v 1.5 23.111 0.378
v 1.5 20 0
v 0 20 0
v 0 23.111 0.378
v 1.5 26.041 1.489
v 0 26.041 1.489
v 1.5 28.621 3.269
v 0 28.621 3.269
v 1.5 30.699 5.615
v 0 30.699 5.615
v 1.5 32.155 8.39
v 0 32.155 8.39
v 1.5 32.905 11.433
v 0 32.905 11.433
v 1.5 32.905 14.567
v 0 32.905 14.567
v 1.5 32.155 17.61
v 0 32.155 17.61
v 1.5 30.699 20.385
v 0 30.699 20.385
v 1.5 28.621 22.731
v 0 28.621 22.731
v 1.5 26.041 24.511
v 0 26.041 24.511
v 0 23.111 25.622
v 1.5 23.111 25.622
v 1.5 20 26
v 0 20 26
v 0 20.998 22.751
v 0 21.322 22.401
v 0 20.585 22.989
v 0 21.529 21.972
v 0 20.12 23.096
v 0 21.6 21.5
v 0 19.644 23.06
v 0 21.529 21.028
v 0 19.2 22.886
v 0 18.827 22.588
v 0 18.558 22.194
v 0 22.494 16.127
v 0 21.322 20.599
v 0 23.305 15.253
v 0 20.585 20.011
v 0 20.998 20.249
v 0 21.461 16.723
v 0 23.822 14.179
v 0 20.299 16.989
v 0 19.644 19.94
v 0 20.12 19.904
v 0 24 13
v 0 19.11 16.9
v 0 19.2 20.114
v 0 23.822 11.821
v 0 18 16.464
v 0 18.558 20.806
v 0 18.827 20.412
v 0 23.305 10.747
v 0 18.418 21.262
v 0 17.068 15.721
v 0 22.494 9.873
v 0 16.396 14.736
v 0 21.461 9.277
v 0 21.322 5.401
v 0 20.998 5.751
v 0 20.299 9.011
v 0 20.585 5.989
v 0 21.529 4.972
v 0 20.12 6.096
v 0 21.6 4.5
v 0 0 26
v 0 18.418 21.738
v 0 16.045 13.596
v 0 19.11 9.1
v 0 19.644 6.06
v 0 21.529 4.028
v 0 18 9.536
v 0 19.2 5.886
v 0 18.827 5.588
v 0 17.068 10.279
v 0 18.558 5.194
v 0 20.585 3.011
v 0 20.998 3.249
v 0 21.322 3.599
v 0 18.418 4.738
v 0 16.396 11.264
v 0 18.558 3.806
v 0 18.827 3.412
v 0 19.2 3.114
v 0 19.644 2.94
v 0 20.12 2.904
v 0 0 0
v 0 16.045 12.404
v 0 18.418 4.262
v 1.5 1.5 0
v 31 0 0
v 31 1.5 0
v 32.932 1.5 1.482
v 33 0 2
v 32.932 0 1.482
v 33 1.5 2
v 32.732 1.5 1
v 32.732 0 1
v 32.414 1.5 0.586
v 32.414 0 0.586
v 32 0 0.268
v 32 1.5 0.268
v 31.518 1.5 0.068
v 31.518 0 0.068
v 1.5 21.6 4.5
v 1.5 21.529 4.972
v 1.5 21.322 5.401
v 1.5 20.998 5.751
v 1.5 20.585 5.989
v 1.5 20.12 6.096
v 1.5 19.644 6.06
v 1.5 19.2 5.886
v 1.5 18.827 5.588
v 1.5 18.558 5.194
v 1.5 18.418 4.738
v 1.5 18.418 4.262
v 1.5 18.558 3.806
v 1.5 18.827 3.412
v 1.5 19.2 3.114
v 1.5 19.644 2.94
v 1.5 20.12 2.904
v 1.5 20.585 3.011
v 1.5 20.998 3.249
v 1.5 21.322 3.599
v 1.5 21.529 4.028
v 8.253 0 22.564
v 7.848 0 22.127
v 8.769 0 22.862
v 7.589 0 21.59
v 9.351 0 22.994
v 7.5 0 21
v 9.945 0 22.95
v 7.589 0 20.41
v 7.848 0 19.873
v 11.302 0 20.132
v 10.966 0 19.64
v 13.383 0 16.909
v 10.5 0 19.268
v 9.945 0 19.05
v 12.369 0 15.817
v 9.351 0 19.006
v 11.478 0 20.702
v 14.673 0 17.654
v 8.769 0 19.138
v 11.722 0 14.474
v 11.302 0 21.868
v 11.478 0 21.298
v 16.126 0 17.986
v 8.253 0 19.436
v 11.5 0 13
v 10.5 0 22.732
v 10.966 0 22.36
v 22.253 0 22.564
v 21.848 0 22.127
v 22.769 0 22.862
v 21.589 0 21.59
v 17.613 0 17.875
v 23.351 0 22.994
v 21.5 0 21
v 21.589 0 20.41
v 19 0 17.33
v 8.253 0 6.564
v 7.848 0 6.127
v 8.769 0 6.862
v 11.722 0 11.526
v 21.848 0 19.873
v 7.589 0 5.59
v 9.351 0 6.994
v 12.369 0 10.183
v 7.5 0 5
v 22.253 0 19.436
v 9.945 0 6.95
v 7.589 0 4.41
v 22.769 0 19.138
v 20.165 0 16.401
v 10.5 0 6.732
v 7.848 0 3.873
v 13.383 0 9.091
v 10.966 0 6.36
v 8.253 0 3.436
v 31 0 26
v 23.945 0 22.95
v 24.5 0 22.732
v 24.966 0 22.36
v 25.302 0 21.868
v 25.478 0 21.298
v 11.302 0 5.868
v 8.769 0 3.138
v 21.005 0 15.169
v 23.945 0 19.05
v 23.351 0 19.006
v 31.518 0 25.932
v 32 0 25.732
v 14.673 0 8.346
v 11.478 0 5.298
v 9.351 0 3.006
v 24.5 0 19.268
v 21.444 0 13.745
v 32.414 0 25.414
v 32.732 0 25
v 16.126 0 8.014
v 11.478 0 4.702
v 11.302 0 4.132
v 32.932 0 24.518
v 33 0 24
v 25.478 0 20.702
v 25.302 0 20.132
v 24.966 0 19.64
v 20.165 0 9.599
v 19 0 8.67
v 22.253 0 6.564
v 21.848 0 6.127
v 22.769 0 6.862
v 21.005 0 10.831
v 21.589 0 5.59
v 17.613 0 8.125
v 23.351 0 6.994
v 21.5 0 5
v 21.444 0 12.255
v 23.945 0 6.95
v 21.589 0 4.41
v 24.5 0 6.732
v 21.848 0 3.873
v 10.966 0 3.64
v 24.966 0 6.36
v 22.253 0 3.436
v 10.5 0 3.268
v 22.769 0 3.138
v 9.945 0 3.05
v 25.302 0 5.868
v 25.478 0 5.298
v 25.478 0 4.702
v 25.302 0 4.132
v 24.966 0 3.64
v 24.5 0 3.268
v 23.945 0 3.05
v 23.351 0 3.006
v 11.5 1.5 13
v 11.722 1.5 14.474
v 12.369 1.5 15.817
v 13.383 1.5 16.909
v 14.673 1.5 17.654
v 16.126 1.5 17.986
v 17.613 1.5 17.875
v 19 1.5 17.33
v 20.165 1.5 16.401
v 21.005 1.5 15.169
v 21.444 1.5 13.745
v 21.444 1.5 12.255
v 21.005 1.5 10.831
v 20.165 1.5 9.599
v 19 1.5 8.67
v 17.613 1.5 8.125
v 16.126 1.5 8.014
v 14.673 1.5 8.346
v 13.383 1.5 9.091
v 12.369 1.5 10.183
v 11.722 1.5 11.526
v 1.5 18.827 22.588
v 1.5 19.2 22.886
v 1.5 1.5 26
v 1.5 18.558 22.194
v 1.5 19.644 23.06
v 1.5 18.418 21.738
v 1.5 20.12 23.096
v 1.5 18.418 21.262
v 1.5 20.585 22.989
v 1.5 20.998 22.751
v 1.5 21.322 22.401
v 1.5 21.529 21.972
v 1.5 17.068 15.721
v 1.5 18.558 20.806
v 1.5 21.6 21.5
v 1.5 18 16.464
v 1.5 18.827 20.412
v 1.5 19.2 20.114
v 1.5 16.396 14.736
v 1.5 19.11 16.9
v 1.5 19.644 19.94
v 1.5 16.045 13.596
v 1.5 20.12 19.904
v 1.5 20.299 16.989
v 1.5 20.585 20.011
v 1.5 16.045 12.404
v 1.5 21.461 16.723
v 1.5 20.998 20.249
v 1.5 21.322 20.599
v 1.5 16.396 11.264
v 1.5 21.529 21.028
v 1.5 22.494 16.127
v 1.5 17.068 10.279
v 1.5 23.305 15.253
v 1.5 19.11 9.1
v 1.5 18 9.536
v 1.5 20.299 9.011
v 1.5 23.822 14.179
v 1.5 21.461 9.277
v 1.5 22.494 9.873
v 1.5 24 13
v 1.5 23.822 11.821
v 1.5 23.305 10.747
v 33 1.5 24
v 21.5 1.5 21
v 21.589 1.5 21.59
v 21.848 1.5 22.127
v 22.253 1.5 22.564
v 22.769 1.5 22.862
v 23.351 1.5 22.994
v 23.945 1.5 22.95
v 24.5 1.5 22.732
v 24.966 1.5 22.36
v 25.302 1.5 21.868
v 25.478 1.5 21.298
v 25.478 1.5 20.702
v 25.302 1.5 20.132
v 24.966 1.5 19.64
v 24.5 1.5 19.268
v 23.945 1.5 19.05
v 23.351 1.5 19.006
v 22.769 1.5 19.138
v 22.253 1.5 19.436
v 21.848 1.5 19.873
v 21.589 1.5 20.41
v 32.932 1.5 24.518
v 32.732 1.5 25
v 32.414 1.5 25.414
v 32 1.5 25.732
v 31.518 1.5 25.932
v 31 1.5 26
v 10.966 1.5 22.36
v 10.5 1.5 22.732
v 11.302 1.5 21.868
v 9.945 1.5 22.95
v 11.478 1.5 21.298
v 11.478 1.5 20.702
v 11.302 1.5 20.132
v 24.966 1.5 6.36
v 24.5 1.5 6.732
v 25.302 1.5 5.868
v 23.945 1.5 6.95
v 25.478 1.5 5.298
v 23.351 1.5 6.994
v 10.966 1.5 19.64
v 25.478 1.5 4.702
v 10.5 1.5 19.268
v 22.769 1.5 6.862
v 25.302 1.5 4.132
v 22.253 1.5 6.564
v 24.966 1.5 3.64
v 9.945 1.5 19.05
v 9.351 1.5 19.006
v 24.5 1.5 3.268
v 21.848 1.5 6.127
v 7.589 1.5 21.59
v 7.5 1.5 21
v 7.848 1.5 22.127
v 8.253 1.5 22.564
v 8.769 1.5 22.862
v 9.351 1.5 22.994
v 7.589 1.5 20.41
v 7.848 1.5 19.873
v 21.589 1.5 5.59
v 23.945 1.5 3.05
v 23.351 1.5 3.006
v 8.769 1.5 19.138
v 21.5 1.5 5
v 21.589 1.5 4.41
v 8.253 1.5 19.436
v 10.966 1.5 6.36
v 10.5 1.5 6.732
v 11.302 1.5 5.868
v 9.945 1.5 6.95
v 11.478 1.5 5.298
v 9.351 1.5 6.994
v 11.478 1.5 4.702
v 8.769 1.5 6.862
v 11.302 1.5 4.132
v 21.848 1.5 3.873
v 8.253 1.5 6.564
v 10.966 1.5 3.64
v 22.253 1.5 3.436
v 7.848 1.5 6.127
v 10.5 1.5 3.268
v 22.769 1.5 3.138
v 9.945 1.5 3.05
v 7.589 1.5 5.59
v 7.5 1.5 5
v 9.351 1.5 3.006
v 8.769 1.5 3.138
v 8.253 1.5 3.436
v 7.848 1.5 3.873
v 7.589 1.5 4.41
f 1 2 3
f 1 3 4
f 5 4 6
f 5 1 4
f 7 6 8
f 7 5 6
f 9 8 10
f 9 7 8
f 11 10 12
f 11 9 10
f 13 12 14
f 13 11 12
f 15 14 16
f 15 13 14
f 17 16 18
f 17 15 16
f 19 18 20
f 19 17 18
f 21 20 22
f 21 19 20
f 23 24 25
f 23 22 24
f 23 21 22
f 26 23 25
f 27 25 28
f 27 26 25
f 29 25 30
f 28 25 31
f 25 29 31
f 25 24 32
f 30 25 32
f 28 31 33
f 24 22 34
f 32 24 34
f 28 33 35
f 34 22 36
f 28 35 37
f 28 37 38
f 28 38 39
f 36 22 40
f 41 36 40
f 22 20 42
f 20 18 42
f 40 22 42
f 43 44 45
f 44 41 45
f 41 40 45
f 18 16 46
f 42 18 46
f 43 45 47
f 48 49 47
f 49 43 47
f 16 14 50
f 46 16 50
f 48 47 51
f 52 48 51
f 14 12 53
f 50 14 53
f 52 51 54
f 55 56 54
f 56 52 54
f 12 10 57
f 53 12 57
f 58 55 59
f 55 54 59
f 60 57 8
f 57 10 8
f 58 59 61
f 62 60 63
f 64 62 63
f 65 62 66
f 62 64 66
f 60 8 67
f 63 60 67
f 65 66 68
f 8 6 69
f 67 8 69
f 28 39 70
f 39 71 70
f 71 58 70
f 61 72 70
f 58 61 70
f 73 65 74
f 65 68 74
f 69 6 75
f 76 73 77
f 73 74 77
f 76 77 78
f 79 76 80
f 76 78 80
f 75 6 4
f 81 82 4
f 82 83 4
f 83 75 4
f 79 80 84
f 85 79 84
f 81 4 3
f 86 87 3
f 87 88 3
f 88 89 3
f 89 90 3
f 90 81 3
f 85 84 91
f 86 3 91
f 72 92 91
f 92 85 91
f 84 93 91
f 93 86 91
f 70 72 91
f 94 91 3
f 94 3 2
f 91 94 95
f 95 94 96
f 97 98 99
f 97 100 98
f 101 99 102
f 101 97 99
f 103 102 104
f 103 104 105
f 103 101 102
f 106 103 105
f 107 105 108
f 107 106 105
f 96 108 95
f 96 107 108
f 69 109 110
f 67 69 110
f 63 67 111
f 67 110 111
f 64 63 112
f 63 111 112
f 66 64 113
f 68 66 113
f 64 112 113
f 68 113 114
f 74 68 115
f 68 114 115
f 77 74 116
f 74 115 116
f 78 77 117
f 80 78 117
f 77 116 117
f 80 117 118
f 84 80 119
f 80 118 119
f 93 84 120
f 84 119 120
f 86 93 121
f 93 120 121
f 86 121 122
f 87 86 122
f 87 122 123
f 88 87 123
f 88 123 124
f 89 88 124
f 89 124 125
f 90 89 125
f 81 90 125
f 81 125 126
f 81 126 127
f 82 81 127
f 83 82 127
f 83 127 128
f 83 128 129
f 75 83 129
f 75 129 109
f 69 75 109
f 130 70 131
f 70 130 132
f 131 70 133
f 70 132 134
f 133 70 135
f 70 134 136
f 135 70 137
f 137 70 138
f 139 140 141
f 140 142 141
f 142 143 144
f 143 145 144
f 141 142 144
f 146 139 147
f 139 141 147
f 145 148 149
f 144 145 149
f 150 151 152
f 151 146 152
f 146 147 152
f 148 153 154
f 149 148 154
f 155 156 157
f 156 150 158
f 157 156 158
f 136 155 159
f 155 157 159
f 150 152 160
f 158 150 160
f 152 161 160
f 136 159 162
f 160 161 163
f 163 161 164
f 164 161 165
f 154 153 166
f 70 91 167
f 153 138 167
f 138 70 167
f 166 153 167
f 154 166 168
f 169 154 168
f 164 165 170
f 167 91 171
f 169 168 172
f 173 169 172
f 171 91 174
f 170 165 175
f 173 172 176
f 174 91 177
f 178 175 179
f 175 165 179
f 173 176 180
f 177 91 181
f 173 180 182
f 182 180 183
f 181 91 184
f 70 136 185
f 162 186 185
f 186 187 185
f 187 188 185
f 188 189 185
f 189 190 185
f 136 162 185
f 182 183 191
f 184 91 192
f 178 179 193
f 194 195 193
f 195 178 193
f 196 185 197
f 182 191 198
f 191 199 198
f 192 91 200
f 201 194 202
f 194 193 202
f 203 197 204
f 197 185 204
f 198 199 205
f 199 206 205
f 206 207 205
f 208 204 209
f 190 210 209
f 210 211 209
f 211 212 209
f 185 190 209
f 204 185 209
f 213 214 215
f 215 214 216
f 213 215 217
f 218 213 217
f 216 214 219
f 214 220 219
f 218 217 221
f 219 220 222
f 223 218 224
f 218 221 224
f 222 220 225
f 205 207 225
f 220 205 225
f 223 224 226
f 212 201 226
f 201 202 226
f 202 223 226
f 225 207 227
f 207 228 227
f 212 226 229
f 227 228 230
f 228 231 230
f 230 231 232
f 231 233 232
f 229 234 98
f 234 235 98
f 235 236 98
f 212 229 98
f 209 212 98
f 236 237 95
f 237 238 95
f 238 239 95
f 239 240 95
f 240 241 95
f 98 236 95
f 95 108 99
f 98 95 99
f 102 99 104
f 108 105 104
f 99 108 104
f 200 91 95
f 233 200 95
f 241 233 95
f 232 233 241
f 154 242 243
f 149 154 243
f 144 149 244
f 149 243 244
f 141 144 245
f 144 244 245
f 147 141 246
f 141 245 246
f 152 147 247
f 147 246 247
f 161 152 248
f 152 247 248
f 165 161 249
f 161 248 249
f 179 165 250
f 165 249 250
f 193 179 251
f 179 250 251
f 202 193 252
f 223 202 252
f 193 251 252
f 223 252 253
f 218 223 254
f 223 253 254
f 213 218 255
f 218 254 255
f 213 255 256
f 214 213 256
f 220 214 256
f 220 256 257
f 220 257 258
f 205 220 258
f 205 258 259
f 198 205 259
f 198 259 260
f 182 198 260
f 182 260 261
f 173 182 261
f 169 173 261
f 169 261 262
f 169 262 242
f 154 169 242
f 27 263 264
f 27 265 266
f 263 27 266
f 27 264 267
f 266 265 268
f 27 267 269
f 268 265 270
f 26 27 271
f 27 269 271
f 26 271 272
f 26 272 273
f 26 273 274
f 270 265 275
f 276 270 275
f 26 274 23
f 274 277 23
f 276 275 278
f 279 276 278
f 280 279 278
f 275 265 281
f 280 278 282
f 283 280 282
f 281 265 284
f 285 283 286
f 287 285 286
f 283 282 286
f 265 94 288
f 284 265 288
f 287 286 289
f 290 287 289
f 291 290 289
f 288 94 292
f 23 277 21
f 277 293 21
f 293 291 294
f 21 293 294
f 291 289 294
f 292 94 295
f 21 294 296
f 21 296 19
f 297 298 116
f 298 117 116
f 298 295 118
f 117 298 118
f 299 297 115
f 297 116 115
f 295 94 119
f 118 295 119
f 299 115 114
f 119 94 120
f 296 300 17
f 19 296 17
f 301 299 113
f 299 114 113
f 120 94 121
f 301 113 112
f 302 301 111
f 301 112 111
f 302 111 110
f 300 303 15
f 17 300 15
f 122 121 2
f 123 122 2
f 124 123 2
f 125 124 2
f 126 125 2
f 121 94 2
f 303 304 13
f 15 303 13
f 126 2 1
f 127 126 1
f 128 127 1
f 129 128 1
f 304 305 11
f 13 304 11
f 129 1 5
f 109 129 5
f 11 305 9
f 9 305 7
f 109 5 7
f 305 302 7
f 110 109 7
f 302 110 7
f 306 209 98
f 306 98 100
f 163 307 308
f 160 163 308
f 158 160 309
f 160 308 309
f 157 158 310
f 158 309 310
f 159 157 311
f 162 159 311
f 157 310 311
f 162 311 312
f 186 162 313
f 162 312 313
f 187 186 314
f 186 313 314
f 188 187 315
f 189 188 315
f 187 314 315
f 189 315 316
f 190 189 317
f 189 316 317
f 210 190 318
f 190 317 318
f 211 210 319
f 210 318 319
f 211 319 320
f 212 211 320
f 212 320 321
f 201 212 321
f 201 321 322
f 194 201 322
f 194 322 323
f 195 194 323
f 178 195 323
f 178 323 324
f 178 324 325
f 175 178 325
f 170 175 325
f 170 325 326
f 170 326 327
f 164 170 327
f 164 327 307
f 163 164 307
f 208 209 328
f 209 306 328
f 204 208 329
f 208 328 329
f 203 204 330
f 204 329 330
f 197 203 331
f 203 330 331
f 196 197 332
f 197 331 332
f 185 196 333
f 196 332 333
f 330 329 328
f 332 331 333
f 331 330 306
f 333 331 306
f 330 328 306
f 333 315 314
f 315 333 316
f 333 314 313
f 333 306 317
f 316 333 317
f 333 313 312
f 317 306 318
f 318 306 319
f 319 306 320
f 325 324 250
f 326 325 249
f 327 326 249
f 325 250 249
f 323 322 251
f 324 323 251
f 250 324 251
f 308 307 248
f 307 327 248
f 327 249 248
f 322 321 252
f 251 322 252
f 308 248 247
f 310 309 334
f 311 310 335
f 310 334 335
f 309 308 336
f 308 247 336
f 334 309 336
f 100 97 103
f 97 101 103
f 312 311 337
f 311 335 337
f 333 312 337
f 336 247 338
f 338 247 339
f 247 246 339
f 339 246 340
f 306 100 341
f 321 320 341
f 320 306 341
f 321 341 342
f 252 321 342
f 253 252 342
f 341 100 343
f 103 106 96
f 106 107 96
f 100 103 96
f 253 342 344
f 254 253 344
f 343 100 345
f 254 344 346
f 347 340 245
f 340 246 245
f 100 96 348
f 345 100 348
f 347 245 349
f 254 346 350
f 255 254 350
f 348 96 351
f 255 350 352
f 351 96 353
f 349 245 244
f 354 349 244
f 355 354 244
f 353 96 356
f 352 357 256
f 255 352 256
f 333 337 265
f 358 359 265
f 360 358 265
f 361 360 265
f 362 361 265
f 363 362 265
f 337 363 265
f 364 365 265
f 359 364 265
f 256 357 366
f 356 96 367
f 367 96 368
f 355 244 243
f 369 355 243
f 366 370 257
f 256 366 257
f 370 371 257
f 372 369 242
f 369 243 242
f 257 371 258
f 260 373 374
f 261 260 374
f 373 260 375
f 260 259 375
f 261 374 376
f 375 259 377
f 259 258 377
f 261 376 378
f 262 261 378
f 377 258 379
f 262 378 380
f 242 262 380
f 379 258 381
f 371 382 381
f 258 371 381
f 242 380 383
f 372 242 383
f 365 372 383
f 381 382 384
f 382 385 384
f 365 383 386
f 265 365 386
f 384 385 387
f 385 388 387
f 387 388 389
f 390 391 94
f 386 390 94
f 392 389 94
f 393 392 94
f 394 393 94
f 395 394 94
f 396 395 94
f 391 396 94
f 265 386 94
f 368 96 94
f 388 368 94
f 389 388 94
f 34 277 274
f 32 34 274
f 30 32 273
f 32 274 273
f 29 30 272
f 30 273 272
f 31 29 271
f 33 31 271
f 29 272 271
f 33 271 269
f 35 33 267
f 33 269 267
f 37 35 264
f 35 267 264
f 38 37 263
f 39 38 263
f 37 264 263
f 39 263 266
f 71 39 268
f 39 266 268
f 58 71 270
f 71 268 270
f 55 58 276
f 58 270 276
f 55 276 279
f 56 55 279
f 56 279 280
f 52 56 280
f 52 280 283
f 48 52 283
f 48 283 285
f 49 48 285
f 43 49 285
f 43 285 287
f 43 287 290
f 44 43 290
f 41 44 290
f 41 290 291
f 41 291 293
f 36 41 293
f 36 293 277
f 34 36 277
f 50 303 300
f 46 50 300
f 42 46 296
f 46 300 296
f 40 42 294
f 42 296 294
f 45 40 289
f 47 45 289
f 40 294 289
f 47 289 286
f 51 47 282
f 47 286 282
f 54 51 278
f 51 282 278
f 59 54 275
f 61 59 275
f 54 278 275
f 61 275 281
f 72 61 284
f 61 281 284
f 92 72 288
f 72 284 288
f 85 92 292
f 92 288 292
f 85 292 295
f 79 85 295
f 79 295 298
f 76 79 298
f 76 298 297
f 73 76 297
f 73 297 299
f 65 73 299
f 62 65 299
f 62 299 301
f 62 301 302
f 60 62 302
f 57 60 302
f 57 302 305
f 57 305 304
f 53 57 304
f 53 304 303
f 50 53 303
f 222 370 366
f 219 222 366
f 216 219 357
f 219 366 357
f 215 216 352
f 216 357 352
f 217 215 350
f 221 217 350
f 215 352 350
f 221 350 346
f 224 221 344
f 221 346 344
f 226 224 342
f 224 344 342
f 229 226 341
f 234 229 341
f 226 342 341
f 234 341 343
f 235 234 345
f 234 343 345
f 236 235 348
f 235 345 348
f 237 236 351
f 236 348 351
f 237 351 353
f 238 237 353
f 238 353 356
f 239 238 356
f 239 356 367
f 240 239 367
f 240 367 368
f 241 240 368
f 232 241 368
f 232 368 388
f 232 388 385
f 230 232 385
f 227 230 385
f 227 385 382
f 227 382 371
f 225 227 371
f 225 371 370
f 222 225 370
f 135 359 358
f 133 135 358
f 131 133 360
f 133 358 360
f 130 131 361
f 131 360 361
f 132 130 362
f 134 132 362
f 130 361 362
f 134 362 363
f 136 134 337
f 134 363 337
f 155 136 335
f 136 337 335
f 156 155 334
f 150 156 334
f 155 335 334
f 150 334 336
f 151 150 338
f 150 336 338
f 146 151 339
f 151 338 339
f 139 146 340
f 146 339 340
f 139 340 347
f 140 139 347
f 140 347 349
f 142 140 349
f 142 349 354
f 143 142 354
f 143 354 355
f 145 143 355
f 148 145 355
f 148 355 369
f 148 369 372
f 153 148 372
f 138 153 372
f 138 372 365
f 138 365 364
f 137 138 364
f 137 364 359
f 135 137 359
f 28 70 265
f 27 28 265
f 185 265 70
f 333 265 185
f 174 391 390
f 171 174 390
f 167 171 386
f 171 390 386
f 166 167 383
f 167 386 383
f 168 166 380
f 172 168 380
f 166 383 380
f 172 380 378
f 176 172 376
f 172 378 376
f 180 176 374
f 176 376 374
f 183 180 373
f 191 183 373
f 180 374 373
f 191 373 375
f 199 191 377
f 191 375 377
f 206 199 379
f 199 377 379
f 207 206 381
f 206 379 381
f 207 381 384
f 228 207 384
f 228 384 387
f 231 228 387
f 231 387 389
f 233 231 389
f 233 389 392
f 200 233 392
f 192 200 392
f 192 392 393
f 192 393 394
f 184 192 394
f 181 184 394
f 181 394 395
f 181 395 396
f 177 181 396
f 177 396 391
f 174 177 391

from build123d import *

# Parameters (mm, degrees)
BOSS_EXTRUDE1_DEPTH = 26
FILLET1_R           = 2
SKETCH3_R           = 5
SKETCH3_R_2         = 2
CUT_EXTRUDE1_DEPTH  = 53.509522946
SKETCH4_R           = 4
SKETCH4_R_2         = 1.6
CUT_EXTRUDE2_DEPTH  = 53.509522946


with BuildPart() as part:
    # Sketch2 → Boss-Extrude1 (new body)
    with BuildSketch(Plane.XY):
        Polygon((0, 0), (33, 0), (33, 1.5), (1.5, 1.5), (1.5, 33), (0, 33), align=None)
    extrude(amount=BOSS_EXTRUDE1_DEPTH)

    # Fillet1
    fillet1_edges = [part.edges().sort_by_distance(p)[0] for p in [
        (33, 0.75, 26),
        (33, 0.75, 0),
    ]]
    fillet(fillet1_edges, radius=FILLET1_R)

    # Sketch3 → Cut-Extrude1 (cut, through all)
    with BuildSketch(Plane(origin=(0, 1.5, 0), x_dir=(1, 0, 0), z_dir=(0, 1, 0))):
        with Locations(Location((16.5, -13, 0), (0, 0, 180))):
            Circle(SKETCH3_R)
        with Locations(Location((9.5, -5, 0), (0, 0, 180))):
            Circle(SKETCH3_R_2)
        with Locations(Location((23.5, -5, 0), (0, 0, 180))):
            Circle(SKETCH3_R_2)
        with Locations(Location((23.5, -21, 0), (0, 0, 180))):
            Circle(SKETCH3_R_2)
        with Locations(Location((9.5, -21, 0), (0, 0, 180))):
            Circle(SKETCH3_R_2)
    extrude(amount=-CUT_EXTRUDE1_DEPTH, mode=Mode.SUBTRACT)

    # Sketch4 → Cut-Extrude2 (cut, through all)
    with BuildSketch(Plane(origin=(1.5, 0, 0), x_dir=(0, 0, -1), z_dir=(1, 0, 0))):
        with Locations(Location((-13, 20, 0), (0, 0, 90))):
            Circle(SKETCH4_R)
        with Locations(Location((-21.5, 20, 0), (0, 0, 90))):
            Circle(SKETCH4_R_2)
        with Locations(Location((-4.5, 20, 0), (0, 0, 90))):
            Circle(SKETCH4_R_2)
        with BuildLine():
            Line((-26, 20), (-26, 38.59710215))
            Line((-26, 38.59710215), (0, 38.59710215))
            Line((0, 38.59710215), (0, 20))
            ThreePointArc((0, 20), (-13, 33), (-26, 20))
        make_face()
    extrude(amount=-CUT_EXTRUDE2_DEPTH, mode=Mode.SUBTRACT)


solid = part.part
